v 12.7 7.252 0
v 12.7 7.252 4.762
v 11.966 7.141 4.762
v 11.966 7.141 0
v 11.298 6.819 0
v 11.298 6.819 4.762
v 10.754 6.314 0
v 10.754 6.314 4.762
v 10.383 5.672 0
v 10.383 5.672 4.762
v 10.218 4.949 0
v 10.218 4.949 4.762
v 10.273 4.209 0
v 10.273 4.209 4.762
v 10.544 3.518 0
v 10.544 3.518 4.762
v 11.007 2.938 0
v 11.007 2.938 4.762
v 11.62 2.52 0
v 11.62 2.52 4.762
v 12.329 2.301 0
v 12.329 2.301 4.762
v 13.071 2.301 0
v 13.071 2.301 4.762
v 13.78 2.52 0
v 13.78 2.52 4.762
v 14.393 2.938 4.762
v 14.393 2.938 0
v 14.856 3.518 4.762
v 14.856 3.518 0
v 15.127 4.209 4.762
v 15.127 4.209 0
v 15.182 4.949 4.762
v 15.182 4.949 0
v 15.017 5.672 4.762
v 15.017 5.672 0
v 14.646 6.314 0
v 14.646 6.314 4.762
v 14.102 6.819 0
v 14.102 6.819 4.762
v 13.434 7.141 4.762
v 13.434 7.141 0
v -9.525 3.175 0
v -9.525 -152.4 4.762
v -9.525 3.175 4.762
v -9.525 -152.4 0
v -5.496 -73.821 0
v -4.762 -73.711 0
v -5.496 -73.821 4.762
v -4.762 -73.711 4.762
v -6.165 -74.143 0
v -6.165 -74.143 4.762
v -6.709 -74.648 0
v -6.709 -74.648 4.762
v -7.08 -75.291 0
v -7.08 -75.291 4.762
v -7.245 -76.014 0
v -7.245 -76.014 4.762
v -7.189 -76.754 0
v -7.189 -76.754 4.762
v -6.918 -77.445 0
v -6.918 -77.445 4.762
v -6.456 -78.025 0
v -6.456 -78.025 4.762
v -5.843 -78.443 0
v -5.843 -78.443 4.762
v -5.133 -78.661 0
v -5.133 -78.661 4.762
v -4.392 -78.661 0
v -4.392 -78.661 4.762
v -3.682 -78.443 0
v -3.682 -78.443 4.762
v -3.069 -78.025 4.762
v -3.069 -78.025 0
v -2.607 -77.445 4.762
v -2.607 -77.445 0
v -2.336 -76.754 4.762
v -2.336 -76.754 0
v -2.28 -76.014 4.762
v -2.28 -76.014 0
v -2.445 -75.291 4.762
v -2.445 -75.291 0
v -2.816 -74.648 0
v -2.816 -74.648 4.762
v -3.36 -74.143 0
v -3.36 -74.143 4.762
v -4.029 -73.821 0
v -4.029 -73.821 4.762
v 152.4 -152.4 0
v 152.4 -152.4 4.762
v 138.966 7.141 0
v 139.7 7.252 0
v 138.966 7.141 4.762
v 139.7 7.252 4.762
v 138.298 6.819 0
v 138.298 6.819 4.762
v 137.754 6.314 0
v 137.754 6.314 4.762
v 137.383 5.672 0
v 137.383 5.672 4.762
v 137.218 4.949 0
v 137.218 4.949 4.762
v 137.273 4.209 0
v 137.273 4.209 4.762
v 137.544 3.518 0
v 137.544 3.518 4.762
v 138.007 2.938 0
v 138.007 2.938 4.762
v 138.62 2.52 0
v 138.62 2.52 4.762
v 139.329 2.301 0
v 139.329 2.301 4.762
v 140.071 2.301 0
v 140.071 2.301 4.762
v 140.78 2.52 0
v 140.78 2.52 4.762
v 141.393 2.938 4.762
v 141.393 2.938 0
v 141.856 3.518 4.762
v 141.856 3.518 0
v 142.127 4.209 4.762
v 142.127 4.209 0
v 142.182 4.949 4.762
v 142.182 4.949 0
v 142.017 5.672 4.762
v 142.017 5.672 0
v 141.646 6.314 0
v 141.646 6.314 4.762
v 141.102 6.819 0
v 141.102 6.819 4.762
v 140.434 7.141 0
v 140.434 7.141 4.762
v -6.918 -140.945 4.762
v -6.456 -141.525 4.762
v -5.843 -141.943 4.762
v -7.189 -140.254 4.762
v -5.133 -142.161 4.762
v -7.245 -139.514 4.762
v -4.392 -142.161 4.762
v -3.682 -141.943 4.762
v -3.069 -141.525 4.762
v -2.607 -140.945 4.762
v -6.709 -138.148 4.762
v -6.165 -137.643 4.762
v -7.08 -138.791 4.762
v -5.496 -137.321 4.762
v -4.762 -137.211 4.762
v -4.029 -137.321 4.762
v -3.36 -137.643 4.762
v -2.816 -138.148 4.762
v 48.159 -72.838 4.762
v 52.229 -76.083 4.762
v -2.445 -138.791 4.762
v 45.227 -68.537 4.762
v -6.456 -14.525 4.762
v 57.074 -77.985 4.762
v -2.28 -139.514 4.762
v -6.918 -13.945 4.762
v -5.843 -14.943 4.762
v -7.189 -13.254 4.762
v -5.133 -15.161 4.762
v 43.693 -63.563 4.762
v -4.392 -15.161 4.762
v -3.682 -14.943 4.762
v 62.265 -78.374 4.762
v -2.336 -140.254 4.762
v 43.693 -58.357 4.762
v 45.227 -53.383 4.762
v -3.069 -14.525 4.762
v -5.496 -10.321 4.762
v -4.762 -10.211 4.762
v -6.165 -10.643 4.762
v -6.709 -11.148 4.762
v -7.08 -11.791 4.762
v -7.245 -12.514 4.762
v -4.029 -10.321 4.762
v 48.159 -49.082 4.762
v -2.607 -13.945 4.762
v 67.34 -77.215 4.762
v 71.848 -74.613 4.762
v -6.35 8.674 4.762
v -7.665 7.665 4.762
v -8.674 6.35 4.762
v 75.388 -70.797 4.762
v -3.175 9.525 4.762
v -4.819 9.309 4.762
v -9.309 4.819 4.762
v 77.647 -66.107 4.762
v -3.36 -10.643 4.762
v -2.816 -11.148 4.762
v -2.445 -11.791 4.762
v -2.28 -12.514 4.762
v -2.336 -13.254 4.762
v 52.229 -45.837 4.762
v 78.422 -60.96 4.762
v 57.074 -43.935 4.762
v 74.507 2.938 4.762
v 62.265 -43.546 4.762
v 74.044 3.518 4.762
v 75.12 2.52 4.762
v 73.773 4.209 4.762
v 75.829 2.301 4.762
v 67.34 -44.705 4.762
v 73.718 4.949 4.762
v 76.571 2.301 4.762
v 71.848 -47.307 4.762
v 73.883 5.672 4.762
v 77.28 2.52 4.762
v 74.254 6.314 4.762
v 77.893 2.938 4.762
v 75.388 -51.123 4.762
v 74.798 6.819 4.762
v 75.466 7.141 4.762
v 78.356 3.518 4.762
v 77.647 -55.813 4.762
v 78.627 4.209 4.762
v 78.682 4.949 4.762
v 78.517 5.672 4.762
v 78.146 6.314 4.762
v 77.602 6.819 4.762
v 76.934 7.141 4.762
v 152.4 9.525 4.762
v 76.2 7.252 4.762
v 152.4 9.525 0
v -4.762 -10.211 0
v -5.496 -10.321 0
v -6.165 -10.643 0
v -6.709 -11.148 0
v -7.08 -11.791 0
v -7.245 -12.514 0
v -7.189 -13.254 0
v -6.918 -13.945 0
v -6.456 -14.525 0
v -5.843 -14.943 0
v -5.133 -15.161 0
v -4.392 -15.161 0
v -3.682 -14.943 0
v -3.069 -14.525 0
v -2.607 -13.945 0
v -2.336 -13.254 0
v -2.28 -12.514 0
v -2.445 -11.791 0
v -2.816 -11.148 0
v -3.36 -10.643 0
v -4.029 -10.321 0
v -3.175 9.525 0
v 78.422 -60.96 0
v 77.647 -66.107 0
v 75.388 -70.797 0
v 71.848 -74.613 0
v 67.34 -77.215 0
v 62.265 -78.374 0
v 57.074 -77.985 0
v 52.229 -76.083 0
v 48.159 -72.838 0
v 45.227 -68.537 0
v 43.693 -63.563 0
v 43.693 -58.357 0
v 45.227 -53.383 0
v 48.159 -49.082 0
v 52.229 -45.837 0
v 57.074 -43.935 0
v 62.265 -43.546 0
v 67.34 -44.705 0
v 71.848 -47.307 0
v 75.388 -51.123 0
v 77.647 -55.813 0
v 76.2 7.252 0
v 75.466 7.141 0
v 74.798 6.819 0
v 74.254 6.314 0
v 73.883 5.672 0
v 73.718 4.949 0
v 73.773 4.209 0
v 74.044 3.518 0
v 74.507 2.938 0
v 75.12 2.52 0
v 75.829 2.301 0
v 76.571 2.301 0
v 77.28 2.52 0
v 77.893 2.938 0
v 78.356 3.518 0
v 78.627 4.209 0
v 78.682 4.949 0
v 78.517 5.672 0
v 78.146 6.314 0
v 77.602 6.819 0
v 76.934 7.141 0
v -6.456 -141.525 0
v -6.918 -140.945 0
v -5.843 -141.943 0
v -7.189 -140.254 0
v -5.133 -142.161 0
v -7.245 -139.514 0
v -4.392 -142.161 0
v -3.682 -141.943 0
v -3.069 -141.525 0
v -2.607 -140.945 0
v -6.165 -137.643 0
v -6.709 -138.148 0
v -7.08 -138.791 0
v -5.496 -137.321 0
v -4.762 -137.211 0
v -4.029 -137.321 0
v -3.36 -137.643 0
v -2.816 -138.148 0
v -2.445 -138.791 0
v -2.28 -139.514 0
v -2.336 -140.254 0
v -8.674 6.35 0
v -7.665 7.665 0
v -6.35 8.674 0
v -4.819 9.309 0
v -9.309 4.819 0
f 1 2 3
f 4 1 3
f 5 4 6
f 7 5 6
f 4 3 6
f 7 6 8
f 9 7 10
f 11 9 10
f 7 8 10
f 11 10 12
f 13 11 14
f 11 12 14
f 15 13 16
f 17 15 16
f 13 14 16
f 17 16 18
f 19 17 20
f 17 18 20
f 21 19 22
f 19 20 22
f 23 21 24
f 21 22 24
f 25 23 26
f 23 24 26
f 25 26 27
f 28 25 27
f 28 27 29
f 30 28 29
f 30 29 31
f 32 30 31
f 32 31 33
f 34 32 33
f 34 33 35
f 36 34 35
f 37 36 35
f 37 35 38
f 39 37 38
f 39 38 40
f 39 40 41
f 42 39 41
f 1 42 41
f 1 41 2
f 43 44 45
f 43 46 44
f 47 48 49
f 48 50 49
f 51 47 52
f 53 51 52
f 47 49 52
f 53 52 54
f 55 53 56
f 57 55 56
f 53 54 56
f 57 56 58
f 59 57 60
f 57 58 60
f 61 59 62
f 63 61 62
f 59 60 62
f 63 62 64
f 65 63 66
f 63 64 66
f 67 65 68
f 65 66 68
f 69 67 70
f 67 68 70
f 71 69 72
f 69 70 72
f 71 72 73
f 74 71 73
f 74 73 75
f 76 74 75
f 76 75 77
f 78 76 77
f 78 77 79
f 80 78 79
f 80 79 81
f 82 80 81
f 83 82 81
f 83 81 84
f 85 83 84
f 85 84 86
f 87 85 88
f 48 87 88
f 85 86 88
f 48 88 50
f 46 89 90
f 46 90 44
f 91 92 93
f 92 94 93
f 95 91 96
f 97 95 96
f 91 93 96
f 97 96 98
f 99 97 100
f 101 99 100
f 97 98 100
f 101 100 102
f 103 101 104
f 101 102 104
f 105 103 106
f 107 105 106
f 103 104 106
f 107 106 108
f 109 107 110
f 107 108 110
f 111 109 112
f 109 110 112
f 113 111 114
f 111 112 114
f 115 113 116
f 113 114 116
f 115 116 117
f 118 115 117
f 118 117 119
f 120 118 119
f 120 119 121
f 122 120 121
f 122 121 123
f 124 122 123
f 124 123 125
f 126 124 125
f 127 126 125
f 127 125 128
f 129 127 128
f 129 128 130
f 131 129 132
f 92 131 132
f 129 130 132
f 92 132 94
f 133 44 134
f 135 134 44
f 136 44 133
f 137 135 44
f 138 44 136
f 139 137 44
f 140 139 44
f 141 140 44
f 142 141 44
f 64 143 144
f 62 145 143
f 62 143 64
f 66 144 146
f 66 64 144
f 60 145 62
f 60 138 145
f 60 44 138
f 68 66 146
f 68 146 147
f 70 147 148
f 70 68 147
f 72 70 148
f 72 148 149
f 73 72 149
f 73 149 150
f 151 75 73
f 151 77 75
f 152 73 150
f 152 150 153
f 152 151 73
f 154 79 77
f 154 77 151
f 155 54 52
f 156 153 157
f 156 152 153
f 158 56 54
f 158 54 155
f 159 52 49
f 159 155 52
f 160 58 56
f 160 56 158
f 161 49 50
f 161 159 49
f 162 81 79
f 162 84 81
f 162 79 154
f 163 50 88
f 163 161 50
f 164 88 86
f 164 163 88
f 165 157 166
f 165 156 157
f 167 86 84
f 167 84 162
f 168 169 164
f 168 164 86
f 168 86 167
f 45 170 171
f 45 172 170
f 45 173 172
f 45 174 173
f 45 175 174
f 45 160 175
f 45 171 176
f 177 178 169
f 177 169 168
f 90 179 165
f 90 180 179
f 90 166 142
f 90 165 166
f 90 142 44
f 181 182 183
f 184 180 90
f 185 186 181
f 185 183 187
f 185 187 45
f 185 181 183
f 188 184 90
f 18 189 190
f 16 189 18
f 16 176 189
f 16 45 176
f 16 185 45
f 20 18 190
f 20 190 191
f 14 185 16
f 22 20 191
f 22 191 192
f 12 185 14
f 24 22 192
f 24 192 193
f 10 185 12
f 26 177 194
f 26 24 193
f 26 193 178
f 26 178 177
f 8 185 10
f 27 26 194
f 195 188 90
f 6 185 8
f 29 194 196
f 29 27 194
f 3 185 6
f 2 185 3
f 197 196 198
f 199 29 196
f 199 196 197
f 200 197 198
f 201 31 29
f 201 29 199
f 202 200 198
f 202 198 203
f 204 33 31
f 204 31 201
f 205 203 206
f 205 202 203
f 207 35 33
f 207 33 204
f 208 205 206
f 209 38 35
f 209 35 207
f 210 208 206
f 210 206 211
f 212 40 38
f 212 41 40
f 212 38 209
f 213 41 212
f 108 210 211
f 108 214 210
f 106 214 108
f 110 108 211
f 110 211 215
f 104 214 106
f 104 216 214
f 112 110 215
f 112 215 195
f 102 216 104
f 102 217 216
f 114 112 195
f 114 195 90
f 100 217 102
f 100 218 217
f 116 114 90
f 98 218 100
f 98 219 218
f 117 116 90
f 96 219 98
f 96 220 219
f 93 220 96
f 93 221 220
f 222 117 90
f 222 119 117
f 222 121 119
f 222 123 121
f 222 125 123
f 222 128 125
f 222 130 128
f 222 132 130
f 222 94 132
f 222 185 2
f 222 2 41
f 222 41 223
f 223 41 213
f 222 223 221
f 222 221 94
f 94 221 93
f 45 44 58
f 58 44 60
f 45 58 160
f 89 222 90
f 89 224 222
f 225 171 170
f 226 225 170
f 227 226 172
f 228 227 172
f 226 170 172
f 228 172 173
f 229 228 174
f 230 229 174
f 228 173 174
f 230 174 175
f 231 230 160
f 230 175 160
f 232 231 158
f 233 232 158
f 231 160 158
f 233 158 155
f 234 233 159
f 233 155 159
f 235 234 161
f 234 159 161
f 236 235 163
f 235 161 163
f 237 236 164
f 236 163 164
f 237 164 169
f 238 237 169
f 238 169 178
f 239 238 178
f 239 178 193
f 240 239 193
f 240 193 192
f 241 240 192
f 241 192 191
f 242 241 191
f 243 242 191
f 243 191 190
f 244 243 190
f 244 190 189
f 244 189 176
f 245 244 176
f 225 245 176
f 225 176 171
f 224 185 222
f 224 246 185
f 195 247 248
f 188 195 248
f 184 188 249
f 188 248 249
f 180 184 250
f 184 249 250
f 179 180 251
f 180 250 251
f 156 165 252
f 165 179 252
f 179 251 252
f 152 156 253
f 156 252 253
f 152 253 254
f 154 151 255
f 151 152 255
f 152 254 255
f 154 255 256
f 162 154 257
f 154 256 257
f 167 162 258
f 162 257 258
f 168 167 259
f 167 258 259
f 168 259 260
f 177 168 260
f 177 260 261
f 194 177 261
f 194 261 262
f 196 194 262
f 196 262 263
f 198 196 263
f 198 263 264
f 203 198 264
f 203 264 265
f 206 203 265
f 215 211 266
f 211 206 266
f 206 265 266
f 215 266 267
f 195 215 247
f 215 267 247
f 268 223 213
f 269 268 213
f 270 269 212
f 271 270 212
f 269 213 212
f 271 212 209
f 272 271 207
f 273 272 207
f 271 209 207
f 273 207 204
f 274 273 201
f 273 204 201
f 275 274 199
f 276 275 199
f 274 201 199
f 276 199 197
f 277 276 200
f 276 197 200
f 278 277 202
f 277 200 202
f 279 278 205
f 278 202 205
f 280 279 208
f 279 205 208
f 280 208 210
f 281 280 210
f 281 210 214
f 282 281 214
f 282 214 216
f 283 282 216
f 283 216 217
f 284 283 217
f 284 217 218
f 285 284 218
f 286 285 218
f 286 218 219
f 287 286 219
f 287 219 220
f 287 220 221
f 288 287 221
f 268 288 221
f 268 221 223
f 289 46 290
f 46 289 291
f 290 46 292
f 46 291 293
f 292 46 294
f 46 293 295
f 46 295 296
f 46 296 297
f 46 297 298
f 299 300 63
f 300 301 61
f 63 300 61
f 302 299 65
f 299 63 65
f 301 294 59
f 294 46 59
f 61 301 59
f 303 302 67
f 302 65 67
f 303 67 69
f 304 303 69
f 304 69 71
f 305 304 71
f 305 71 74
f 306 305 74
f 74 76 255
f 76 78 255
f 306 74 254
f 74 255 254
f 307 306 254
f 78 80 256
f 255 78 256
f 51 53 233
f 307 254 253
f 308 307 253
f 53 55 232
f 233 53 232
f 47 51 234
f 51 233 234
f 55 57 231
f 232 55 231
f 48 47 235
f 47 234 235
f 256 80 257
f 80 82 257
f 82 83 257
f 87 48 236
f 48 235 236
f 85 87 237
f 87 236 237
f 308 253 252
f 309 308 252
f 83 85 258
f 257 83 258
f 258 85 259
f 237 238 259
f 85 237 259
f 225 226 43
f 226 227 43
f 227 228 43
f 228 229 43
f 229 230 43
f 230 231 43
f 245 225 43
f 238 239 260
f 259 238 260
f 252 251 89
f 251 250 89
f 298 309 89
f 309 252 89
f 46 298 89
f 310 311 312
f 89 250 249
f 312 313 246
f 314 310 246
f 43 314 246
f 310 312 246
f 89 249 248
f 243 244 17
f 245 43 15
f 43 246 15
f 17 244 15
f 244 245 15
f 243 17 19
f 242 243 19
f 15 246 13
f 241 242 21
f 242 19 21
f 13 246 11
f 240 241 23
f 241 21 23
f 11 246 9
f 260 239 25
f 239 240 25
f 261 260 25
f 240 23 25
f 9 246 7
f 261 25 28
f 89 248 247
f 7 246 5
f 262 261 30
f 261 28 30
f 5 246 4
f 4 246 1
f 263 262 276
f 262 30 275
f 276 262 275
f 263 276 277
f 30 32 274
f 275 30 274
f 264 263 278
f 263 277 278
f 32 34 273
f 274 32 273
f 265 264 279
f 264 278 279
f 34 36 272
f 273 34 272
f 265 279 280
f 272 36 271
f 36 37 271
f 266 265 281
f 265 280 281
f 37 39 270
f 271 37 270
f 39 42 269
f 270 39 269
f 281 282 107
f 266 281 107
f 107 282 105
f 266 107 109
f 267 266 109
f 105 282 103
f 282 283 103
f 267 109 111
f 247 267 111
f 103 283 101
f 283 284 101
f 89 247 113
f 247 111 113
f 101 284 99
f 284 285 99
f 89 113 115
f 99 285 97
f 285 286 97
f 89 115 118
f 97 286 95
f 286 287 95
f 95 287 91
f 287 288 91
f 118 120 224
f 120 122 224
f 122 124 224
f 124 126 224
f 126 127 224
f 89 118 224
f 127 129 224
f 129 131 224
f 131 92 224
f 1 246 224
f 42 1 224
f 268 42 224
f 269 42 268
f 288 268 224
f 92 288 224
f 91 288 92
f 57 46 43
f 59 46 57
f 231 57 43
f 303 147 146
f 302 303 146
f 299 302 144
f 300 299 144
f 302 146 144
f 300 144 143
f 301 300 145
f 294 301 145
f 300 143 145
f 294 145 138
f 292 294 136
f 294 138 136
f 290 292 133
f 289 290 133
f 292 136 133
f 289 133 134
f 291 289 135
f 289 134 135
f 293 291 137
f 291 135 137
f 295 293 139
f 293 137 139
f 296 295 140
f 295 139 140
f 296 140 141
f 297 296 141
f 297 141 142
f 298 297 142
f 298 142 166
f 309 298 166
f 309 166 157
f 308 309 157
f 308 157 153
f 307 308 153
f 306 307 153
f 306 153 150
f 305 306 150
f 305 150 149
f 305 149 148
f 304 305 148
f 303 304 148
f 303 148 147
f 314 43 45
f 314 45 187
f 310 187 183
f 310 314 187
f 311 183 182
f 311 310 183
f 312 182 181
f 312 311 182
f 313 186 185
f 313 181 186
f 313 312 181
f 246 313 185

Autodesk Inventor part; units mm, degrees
ref_plane "YZ Plane" through (0, 0, 0) normal (1, 0, 0) x (0, 1, 0)
ref_plane "XZ Plane" through (0, 0, 0) normal (0, 1, 0) x (-1, 0, 0)
ref_plane "XY Plane" through (0, 0, 0) normal (0, 0, 1) x (1, 0, 0)
sketch "Sketch1" plane through (0, 0, 0) normal (0, 0, 1) x (1, 0, 0)
  line L0 (0, 0) -> (152.4, 0)
  line L1 (152.4, 0) -> (152.4, -152.4)
  line L2 (152.4, -152.4) -> (0, -152.4)
  line L3 (0, -152.4) -> (0, 0)
  line L4 (0, -152.4) -> (-50.8, -152.4) construction
  line L5 (-50.8, -152.4) -> (-50.8, 25.4) construction
  line L6 (0, 0) -> (0, -152.4)
  line L7 (-47.625, 25.4) -> (152.4, 25.4) construction
  line L8 (152.4, 25.4) -> (152.4, 0) construction
  line L9 (152.4, 0) -> (0, 0)
  line L10 (-47.625, 0) -> (-47.625, 25.4) construction
  line L11 (-50.8, -152.4) -> (-50.8, 25.4) construction
  line L12 (-50.8, 25.4) -> (-47.625, 25.4) construction
  circle A0 centre (60.96, -60.96) radius 54.61 construction
  circle A1 centre (60.96, -60.96) radius 53.34 construction
  circle A2 centre (60.96, -60.96) radius 17.4625
  line L13 (0, 0) -> (-47.625, 0) construction
  line L14 (0, -152.4) -> (-9.525, -152.4)
  line L15 (-9.525, -152.4) -> (-9.525, 3.175)
  line L16 (-3.175, 9.525) -> (152.4, 9.525)
  line L17 (152.4, 0) -> (152.4, 9.525)
  circle A3 centre (60.96, -60.96) radius 47.2059 construction
  line L18 (-4.7625, 9.525) -> (-4.7625, -152.4) construction
  line L19 (-9.525, 4.7625) -> (152.4, 4.7625) construction
  arc A4 (-3.175, 9.525) -> (-9.525, 3.175) centre (-3.175, 3.175) ccw
  point P0 (-9.525, 9.525)
  point P1 (12.7, 4.7625)
  point P2 (-4.7625, -12.7)
  point P3 (76.2, 4.7625)
  point P4 (139.7, 4.7625)
  point P5 (-4.7625, -76.2)
  point P6 (-4.7625, -139.7)
  dimension "d0" = 152.4
  dimension "d8" = 50.8
  dimension "d12" = 3.175
  dimension "d28" = 152.4
  dimension "d29" = 109.22
  dimension "d30" = 106.68
  dimension "d31" = 60.96
  dimension "d32" = 60.96
  dimension "d33" = 34.925
  dimension "d34" = 9.525
  dimension "d35" = 9.525
  dimension "d41" = 94.4118
  dimension "d42" = 25.4
  dimension "d43" = 22.225
  dimension "d44" = 22.225
  dimension "d45" = 6.35
  dimension "d48" = 63.5
  dimension "d55" = 63.5
extrude "Extrusion1" add sketch "Sketch1" along normal blind 4.7625
hole "Hole1" at (12.7, 4.7625, 0) at (-4.7625, -12.7, 0) at (76.2, 4.7625, 0) at (139.7, 4.7625, 0) at (-4.7625, -76.2, 0) at (-4.7625, -139.7, 0) direction (0, 0, 1) diameter 4.9784 end through all clearance for "Socket Head Cap Screw" size "#10" standard "Ansi Unified Screw Threads"
properties part number "Module Plate - Bottom"
